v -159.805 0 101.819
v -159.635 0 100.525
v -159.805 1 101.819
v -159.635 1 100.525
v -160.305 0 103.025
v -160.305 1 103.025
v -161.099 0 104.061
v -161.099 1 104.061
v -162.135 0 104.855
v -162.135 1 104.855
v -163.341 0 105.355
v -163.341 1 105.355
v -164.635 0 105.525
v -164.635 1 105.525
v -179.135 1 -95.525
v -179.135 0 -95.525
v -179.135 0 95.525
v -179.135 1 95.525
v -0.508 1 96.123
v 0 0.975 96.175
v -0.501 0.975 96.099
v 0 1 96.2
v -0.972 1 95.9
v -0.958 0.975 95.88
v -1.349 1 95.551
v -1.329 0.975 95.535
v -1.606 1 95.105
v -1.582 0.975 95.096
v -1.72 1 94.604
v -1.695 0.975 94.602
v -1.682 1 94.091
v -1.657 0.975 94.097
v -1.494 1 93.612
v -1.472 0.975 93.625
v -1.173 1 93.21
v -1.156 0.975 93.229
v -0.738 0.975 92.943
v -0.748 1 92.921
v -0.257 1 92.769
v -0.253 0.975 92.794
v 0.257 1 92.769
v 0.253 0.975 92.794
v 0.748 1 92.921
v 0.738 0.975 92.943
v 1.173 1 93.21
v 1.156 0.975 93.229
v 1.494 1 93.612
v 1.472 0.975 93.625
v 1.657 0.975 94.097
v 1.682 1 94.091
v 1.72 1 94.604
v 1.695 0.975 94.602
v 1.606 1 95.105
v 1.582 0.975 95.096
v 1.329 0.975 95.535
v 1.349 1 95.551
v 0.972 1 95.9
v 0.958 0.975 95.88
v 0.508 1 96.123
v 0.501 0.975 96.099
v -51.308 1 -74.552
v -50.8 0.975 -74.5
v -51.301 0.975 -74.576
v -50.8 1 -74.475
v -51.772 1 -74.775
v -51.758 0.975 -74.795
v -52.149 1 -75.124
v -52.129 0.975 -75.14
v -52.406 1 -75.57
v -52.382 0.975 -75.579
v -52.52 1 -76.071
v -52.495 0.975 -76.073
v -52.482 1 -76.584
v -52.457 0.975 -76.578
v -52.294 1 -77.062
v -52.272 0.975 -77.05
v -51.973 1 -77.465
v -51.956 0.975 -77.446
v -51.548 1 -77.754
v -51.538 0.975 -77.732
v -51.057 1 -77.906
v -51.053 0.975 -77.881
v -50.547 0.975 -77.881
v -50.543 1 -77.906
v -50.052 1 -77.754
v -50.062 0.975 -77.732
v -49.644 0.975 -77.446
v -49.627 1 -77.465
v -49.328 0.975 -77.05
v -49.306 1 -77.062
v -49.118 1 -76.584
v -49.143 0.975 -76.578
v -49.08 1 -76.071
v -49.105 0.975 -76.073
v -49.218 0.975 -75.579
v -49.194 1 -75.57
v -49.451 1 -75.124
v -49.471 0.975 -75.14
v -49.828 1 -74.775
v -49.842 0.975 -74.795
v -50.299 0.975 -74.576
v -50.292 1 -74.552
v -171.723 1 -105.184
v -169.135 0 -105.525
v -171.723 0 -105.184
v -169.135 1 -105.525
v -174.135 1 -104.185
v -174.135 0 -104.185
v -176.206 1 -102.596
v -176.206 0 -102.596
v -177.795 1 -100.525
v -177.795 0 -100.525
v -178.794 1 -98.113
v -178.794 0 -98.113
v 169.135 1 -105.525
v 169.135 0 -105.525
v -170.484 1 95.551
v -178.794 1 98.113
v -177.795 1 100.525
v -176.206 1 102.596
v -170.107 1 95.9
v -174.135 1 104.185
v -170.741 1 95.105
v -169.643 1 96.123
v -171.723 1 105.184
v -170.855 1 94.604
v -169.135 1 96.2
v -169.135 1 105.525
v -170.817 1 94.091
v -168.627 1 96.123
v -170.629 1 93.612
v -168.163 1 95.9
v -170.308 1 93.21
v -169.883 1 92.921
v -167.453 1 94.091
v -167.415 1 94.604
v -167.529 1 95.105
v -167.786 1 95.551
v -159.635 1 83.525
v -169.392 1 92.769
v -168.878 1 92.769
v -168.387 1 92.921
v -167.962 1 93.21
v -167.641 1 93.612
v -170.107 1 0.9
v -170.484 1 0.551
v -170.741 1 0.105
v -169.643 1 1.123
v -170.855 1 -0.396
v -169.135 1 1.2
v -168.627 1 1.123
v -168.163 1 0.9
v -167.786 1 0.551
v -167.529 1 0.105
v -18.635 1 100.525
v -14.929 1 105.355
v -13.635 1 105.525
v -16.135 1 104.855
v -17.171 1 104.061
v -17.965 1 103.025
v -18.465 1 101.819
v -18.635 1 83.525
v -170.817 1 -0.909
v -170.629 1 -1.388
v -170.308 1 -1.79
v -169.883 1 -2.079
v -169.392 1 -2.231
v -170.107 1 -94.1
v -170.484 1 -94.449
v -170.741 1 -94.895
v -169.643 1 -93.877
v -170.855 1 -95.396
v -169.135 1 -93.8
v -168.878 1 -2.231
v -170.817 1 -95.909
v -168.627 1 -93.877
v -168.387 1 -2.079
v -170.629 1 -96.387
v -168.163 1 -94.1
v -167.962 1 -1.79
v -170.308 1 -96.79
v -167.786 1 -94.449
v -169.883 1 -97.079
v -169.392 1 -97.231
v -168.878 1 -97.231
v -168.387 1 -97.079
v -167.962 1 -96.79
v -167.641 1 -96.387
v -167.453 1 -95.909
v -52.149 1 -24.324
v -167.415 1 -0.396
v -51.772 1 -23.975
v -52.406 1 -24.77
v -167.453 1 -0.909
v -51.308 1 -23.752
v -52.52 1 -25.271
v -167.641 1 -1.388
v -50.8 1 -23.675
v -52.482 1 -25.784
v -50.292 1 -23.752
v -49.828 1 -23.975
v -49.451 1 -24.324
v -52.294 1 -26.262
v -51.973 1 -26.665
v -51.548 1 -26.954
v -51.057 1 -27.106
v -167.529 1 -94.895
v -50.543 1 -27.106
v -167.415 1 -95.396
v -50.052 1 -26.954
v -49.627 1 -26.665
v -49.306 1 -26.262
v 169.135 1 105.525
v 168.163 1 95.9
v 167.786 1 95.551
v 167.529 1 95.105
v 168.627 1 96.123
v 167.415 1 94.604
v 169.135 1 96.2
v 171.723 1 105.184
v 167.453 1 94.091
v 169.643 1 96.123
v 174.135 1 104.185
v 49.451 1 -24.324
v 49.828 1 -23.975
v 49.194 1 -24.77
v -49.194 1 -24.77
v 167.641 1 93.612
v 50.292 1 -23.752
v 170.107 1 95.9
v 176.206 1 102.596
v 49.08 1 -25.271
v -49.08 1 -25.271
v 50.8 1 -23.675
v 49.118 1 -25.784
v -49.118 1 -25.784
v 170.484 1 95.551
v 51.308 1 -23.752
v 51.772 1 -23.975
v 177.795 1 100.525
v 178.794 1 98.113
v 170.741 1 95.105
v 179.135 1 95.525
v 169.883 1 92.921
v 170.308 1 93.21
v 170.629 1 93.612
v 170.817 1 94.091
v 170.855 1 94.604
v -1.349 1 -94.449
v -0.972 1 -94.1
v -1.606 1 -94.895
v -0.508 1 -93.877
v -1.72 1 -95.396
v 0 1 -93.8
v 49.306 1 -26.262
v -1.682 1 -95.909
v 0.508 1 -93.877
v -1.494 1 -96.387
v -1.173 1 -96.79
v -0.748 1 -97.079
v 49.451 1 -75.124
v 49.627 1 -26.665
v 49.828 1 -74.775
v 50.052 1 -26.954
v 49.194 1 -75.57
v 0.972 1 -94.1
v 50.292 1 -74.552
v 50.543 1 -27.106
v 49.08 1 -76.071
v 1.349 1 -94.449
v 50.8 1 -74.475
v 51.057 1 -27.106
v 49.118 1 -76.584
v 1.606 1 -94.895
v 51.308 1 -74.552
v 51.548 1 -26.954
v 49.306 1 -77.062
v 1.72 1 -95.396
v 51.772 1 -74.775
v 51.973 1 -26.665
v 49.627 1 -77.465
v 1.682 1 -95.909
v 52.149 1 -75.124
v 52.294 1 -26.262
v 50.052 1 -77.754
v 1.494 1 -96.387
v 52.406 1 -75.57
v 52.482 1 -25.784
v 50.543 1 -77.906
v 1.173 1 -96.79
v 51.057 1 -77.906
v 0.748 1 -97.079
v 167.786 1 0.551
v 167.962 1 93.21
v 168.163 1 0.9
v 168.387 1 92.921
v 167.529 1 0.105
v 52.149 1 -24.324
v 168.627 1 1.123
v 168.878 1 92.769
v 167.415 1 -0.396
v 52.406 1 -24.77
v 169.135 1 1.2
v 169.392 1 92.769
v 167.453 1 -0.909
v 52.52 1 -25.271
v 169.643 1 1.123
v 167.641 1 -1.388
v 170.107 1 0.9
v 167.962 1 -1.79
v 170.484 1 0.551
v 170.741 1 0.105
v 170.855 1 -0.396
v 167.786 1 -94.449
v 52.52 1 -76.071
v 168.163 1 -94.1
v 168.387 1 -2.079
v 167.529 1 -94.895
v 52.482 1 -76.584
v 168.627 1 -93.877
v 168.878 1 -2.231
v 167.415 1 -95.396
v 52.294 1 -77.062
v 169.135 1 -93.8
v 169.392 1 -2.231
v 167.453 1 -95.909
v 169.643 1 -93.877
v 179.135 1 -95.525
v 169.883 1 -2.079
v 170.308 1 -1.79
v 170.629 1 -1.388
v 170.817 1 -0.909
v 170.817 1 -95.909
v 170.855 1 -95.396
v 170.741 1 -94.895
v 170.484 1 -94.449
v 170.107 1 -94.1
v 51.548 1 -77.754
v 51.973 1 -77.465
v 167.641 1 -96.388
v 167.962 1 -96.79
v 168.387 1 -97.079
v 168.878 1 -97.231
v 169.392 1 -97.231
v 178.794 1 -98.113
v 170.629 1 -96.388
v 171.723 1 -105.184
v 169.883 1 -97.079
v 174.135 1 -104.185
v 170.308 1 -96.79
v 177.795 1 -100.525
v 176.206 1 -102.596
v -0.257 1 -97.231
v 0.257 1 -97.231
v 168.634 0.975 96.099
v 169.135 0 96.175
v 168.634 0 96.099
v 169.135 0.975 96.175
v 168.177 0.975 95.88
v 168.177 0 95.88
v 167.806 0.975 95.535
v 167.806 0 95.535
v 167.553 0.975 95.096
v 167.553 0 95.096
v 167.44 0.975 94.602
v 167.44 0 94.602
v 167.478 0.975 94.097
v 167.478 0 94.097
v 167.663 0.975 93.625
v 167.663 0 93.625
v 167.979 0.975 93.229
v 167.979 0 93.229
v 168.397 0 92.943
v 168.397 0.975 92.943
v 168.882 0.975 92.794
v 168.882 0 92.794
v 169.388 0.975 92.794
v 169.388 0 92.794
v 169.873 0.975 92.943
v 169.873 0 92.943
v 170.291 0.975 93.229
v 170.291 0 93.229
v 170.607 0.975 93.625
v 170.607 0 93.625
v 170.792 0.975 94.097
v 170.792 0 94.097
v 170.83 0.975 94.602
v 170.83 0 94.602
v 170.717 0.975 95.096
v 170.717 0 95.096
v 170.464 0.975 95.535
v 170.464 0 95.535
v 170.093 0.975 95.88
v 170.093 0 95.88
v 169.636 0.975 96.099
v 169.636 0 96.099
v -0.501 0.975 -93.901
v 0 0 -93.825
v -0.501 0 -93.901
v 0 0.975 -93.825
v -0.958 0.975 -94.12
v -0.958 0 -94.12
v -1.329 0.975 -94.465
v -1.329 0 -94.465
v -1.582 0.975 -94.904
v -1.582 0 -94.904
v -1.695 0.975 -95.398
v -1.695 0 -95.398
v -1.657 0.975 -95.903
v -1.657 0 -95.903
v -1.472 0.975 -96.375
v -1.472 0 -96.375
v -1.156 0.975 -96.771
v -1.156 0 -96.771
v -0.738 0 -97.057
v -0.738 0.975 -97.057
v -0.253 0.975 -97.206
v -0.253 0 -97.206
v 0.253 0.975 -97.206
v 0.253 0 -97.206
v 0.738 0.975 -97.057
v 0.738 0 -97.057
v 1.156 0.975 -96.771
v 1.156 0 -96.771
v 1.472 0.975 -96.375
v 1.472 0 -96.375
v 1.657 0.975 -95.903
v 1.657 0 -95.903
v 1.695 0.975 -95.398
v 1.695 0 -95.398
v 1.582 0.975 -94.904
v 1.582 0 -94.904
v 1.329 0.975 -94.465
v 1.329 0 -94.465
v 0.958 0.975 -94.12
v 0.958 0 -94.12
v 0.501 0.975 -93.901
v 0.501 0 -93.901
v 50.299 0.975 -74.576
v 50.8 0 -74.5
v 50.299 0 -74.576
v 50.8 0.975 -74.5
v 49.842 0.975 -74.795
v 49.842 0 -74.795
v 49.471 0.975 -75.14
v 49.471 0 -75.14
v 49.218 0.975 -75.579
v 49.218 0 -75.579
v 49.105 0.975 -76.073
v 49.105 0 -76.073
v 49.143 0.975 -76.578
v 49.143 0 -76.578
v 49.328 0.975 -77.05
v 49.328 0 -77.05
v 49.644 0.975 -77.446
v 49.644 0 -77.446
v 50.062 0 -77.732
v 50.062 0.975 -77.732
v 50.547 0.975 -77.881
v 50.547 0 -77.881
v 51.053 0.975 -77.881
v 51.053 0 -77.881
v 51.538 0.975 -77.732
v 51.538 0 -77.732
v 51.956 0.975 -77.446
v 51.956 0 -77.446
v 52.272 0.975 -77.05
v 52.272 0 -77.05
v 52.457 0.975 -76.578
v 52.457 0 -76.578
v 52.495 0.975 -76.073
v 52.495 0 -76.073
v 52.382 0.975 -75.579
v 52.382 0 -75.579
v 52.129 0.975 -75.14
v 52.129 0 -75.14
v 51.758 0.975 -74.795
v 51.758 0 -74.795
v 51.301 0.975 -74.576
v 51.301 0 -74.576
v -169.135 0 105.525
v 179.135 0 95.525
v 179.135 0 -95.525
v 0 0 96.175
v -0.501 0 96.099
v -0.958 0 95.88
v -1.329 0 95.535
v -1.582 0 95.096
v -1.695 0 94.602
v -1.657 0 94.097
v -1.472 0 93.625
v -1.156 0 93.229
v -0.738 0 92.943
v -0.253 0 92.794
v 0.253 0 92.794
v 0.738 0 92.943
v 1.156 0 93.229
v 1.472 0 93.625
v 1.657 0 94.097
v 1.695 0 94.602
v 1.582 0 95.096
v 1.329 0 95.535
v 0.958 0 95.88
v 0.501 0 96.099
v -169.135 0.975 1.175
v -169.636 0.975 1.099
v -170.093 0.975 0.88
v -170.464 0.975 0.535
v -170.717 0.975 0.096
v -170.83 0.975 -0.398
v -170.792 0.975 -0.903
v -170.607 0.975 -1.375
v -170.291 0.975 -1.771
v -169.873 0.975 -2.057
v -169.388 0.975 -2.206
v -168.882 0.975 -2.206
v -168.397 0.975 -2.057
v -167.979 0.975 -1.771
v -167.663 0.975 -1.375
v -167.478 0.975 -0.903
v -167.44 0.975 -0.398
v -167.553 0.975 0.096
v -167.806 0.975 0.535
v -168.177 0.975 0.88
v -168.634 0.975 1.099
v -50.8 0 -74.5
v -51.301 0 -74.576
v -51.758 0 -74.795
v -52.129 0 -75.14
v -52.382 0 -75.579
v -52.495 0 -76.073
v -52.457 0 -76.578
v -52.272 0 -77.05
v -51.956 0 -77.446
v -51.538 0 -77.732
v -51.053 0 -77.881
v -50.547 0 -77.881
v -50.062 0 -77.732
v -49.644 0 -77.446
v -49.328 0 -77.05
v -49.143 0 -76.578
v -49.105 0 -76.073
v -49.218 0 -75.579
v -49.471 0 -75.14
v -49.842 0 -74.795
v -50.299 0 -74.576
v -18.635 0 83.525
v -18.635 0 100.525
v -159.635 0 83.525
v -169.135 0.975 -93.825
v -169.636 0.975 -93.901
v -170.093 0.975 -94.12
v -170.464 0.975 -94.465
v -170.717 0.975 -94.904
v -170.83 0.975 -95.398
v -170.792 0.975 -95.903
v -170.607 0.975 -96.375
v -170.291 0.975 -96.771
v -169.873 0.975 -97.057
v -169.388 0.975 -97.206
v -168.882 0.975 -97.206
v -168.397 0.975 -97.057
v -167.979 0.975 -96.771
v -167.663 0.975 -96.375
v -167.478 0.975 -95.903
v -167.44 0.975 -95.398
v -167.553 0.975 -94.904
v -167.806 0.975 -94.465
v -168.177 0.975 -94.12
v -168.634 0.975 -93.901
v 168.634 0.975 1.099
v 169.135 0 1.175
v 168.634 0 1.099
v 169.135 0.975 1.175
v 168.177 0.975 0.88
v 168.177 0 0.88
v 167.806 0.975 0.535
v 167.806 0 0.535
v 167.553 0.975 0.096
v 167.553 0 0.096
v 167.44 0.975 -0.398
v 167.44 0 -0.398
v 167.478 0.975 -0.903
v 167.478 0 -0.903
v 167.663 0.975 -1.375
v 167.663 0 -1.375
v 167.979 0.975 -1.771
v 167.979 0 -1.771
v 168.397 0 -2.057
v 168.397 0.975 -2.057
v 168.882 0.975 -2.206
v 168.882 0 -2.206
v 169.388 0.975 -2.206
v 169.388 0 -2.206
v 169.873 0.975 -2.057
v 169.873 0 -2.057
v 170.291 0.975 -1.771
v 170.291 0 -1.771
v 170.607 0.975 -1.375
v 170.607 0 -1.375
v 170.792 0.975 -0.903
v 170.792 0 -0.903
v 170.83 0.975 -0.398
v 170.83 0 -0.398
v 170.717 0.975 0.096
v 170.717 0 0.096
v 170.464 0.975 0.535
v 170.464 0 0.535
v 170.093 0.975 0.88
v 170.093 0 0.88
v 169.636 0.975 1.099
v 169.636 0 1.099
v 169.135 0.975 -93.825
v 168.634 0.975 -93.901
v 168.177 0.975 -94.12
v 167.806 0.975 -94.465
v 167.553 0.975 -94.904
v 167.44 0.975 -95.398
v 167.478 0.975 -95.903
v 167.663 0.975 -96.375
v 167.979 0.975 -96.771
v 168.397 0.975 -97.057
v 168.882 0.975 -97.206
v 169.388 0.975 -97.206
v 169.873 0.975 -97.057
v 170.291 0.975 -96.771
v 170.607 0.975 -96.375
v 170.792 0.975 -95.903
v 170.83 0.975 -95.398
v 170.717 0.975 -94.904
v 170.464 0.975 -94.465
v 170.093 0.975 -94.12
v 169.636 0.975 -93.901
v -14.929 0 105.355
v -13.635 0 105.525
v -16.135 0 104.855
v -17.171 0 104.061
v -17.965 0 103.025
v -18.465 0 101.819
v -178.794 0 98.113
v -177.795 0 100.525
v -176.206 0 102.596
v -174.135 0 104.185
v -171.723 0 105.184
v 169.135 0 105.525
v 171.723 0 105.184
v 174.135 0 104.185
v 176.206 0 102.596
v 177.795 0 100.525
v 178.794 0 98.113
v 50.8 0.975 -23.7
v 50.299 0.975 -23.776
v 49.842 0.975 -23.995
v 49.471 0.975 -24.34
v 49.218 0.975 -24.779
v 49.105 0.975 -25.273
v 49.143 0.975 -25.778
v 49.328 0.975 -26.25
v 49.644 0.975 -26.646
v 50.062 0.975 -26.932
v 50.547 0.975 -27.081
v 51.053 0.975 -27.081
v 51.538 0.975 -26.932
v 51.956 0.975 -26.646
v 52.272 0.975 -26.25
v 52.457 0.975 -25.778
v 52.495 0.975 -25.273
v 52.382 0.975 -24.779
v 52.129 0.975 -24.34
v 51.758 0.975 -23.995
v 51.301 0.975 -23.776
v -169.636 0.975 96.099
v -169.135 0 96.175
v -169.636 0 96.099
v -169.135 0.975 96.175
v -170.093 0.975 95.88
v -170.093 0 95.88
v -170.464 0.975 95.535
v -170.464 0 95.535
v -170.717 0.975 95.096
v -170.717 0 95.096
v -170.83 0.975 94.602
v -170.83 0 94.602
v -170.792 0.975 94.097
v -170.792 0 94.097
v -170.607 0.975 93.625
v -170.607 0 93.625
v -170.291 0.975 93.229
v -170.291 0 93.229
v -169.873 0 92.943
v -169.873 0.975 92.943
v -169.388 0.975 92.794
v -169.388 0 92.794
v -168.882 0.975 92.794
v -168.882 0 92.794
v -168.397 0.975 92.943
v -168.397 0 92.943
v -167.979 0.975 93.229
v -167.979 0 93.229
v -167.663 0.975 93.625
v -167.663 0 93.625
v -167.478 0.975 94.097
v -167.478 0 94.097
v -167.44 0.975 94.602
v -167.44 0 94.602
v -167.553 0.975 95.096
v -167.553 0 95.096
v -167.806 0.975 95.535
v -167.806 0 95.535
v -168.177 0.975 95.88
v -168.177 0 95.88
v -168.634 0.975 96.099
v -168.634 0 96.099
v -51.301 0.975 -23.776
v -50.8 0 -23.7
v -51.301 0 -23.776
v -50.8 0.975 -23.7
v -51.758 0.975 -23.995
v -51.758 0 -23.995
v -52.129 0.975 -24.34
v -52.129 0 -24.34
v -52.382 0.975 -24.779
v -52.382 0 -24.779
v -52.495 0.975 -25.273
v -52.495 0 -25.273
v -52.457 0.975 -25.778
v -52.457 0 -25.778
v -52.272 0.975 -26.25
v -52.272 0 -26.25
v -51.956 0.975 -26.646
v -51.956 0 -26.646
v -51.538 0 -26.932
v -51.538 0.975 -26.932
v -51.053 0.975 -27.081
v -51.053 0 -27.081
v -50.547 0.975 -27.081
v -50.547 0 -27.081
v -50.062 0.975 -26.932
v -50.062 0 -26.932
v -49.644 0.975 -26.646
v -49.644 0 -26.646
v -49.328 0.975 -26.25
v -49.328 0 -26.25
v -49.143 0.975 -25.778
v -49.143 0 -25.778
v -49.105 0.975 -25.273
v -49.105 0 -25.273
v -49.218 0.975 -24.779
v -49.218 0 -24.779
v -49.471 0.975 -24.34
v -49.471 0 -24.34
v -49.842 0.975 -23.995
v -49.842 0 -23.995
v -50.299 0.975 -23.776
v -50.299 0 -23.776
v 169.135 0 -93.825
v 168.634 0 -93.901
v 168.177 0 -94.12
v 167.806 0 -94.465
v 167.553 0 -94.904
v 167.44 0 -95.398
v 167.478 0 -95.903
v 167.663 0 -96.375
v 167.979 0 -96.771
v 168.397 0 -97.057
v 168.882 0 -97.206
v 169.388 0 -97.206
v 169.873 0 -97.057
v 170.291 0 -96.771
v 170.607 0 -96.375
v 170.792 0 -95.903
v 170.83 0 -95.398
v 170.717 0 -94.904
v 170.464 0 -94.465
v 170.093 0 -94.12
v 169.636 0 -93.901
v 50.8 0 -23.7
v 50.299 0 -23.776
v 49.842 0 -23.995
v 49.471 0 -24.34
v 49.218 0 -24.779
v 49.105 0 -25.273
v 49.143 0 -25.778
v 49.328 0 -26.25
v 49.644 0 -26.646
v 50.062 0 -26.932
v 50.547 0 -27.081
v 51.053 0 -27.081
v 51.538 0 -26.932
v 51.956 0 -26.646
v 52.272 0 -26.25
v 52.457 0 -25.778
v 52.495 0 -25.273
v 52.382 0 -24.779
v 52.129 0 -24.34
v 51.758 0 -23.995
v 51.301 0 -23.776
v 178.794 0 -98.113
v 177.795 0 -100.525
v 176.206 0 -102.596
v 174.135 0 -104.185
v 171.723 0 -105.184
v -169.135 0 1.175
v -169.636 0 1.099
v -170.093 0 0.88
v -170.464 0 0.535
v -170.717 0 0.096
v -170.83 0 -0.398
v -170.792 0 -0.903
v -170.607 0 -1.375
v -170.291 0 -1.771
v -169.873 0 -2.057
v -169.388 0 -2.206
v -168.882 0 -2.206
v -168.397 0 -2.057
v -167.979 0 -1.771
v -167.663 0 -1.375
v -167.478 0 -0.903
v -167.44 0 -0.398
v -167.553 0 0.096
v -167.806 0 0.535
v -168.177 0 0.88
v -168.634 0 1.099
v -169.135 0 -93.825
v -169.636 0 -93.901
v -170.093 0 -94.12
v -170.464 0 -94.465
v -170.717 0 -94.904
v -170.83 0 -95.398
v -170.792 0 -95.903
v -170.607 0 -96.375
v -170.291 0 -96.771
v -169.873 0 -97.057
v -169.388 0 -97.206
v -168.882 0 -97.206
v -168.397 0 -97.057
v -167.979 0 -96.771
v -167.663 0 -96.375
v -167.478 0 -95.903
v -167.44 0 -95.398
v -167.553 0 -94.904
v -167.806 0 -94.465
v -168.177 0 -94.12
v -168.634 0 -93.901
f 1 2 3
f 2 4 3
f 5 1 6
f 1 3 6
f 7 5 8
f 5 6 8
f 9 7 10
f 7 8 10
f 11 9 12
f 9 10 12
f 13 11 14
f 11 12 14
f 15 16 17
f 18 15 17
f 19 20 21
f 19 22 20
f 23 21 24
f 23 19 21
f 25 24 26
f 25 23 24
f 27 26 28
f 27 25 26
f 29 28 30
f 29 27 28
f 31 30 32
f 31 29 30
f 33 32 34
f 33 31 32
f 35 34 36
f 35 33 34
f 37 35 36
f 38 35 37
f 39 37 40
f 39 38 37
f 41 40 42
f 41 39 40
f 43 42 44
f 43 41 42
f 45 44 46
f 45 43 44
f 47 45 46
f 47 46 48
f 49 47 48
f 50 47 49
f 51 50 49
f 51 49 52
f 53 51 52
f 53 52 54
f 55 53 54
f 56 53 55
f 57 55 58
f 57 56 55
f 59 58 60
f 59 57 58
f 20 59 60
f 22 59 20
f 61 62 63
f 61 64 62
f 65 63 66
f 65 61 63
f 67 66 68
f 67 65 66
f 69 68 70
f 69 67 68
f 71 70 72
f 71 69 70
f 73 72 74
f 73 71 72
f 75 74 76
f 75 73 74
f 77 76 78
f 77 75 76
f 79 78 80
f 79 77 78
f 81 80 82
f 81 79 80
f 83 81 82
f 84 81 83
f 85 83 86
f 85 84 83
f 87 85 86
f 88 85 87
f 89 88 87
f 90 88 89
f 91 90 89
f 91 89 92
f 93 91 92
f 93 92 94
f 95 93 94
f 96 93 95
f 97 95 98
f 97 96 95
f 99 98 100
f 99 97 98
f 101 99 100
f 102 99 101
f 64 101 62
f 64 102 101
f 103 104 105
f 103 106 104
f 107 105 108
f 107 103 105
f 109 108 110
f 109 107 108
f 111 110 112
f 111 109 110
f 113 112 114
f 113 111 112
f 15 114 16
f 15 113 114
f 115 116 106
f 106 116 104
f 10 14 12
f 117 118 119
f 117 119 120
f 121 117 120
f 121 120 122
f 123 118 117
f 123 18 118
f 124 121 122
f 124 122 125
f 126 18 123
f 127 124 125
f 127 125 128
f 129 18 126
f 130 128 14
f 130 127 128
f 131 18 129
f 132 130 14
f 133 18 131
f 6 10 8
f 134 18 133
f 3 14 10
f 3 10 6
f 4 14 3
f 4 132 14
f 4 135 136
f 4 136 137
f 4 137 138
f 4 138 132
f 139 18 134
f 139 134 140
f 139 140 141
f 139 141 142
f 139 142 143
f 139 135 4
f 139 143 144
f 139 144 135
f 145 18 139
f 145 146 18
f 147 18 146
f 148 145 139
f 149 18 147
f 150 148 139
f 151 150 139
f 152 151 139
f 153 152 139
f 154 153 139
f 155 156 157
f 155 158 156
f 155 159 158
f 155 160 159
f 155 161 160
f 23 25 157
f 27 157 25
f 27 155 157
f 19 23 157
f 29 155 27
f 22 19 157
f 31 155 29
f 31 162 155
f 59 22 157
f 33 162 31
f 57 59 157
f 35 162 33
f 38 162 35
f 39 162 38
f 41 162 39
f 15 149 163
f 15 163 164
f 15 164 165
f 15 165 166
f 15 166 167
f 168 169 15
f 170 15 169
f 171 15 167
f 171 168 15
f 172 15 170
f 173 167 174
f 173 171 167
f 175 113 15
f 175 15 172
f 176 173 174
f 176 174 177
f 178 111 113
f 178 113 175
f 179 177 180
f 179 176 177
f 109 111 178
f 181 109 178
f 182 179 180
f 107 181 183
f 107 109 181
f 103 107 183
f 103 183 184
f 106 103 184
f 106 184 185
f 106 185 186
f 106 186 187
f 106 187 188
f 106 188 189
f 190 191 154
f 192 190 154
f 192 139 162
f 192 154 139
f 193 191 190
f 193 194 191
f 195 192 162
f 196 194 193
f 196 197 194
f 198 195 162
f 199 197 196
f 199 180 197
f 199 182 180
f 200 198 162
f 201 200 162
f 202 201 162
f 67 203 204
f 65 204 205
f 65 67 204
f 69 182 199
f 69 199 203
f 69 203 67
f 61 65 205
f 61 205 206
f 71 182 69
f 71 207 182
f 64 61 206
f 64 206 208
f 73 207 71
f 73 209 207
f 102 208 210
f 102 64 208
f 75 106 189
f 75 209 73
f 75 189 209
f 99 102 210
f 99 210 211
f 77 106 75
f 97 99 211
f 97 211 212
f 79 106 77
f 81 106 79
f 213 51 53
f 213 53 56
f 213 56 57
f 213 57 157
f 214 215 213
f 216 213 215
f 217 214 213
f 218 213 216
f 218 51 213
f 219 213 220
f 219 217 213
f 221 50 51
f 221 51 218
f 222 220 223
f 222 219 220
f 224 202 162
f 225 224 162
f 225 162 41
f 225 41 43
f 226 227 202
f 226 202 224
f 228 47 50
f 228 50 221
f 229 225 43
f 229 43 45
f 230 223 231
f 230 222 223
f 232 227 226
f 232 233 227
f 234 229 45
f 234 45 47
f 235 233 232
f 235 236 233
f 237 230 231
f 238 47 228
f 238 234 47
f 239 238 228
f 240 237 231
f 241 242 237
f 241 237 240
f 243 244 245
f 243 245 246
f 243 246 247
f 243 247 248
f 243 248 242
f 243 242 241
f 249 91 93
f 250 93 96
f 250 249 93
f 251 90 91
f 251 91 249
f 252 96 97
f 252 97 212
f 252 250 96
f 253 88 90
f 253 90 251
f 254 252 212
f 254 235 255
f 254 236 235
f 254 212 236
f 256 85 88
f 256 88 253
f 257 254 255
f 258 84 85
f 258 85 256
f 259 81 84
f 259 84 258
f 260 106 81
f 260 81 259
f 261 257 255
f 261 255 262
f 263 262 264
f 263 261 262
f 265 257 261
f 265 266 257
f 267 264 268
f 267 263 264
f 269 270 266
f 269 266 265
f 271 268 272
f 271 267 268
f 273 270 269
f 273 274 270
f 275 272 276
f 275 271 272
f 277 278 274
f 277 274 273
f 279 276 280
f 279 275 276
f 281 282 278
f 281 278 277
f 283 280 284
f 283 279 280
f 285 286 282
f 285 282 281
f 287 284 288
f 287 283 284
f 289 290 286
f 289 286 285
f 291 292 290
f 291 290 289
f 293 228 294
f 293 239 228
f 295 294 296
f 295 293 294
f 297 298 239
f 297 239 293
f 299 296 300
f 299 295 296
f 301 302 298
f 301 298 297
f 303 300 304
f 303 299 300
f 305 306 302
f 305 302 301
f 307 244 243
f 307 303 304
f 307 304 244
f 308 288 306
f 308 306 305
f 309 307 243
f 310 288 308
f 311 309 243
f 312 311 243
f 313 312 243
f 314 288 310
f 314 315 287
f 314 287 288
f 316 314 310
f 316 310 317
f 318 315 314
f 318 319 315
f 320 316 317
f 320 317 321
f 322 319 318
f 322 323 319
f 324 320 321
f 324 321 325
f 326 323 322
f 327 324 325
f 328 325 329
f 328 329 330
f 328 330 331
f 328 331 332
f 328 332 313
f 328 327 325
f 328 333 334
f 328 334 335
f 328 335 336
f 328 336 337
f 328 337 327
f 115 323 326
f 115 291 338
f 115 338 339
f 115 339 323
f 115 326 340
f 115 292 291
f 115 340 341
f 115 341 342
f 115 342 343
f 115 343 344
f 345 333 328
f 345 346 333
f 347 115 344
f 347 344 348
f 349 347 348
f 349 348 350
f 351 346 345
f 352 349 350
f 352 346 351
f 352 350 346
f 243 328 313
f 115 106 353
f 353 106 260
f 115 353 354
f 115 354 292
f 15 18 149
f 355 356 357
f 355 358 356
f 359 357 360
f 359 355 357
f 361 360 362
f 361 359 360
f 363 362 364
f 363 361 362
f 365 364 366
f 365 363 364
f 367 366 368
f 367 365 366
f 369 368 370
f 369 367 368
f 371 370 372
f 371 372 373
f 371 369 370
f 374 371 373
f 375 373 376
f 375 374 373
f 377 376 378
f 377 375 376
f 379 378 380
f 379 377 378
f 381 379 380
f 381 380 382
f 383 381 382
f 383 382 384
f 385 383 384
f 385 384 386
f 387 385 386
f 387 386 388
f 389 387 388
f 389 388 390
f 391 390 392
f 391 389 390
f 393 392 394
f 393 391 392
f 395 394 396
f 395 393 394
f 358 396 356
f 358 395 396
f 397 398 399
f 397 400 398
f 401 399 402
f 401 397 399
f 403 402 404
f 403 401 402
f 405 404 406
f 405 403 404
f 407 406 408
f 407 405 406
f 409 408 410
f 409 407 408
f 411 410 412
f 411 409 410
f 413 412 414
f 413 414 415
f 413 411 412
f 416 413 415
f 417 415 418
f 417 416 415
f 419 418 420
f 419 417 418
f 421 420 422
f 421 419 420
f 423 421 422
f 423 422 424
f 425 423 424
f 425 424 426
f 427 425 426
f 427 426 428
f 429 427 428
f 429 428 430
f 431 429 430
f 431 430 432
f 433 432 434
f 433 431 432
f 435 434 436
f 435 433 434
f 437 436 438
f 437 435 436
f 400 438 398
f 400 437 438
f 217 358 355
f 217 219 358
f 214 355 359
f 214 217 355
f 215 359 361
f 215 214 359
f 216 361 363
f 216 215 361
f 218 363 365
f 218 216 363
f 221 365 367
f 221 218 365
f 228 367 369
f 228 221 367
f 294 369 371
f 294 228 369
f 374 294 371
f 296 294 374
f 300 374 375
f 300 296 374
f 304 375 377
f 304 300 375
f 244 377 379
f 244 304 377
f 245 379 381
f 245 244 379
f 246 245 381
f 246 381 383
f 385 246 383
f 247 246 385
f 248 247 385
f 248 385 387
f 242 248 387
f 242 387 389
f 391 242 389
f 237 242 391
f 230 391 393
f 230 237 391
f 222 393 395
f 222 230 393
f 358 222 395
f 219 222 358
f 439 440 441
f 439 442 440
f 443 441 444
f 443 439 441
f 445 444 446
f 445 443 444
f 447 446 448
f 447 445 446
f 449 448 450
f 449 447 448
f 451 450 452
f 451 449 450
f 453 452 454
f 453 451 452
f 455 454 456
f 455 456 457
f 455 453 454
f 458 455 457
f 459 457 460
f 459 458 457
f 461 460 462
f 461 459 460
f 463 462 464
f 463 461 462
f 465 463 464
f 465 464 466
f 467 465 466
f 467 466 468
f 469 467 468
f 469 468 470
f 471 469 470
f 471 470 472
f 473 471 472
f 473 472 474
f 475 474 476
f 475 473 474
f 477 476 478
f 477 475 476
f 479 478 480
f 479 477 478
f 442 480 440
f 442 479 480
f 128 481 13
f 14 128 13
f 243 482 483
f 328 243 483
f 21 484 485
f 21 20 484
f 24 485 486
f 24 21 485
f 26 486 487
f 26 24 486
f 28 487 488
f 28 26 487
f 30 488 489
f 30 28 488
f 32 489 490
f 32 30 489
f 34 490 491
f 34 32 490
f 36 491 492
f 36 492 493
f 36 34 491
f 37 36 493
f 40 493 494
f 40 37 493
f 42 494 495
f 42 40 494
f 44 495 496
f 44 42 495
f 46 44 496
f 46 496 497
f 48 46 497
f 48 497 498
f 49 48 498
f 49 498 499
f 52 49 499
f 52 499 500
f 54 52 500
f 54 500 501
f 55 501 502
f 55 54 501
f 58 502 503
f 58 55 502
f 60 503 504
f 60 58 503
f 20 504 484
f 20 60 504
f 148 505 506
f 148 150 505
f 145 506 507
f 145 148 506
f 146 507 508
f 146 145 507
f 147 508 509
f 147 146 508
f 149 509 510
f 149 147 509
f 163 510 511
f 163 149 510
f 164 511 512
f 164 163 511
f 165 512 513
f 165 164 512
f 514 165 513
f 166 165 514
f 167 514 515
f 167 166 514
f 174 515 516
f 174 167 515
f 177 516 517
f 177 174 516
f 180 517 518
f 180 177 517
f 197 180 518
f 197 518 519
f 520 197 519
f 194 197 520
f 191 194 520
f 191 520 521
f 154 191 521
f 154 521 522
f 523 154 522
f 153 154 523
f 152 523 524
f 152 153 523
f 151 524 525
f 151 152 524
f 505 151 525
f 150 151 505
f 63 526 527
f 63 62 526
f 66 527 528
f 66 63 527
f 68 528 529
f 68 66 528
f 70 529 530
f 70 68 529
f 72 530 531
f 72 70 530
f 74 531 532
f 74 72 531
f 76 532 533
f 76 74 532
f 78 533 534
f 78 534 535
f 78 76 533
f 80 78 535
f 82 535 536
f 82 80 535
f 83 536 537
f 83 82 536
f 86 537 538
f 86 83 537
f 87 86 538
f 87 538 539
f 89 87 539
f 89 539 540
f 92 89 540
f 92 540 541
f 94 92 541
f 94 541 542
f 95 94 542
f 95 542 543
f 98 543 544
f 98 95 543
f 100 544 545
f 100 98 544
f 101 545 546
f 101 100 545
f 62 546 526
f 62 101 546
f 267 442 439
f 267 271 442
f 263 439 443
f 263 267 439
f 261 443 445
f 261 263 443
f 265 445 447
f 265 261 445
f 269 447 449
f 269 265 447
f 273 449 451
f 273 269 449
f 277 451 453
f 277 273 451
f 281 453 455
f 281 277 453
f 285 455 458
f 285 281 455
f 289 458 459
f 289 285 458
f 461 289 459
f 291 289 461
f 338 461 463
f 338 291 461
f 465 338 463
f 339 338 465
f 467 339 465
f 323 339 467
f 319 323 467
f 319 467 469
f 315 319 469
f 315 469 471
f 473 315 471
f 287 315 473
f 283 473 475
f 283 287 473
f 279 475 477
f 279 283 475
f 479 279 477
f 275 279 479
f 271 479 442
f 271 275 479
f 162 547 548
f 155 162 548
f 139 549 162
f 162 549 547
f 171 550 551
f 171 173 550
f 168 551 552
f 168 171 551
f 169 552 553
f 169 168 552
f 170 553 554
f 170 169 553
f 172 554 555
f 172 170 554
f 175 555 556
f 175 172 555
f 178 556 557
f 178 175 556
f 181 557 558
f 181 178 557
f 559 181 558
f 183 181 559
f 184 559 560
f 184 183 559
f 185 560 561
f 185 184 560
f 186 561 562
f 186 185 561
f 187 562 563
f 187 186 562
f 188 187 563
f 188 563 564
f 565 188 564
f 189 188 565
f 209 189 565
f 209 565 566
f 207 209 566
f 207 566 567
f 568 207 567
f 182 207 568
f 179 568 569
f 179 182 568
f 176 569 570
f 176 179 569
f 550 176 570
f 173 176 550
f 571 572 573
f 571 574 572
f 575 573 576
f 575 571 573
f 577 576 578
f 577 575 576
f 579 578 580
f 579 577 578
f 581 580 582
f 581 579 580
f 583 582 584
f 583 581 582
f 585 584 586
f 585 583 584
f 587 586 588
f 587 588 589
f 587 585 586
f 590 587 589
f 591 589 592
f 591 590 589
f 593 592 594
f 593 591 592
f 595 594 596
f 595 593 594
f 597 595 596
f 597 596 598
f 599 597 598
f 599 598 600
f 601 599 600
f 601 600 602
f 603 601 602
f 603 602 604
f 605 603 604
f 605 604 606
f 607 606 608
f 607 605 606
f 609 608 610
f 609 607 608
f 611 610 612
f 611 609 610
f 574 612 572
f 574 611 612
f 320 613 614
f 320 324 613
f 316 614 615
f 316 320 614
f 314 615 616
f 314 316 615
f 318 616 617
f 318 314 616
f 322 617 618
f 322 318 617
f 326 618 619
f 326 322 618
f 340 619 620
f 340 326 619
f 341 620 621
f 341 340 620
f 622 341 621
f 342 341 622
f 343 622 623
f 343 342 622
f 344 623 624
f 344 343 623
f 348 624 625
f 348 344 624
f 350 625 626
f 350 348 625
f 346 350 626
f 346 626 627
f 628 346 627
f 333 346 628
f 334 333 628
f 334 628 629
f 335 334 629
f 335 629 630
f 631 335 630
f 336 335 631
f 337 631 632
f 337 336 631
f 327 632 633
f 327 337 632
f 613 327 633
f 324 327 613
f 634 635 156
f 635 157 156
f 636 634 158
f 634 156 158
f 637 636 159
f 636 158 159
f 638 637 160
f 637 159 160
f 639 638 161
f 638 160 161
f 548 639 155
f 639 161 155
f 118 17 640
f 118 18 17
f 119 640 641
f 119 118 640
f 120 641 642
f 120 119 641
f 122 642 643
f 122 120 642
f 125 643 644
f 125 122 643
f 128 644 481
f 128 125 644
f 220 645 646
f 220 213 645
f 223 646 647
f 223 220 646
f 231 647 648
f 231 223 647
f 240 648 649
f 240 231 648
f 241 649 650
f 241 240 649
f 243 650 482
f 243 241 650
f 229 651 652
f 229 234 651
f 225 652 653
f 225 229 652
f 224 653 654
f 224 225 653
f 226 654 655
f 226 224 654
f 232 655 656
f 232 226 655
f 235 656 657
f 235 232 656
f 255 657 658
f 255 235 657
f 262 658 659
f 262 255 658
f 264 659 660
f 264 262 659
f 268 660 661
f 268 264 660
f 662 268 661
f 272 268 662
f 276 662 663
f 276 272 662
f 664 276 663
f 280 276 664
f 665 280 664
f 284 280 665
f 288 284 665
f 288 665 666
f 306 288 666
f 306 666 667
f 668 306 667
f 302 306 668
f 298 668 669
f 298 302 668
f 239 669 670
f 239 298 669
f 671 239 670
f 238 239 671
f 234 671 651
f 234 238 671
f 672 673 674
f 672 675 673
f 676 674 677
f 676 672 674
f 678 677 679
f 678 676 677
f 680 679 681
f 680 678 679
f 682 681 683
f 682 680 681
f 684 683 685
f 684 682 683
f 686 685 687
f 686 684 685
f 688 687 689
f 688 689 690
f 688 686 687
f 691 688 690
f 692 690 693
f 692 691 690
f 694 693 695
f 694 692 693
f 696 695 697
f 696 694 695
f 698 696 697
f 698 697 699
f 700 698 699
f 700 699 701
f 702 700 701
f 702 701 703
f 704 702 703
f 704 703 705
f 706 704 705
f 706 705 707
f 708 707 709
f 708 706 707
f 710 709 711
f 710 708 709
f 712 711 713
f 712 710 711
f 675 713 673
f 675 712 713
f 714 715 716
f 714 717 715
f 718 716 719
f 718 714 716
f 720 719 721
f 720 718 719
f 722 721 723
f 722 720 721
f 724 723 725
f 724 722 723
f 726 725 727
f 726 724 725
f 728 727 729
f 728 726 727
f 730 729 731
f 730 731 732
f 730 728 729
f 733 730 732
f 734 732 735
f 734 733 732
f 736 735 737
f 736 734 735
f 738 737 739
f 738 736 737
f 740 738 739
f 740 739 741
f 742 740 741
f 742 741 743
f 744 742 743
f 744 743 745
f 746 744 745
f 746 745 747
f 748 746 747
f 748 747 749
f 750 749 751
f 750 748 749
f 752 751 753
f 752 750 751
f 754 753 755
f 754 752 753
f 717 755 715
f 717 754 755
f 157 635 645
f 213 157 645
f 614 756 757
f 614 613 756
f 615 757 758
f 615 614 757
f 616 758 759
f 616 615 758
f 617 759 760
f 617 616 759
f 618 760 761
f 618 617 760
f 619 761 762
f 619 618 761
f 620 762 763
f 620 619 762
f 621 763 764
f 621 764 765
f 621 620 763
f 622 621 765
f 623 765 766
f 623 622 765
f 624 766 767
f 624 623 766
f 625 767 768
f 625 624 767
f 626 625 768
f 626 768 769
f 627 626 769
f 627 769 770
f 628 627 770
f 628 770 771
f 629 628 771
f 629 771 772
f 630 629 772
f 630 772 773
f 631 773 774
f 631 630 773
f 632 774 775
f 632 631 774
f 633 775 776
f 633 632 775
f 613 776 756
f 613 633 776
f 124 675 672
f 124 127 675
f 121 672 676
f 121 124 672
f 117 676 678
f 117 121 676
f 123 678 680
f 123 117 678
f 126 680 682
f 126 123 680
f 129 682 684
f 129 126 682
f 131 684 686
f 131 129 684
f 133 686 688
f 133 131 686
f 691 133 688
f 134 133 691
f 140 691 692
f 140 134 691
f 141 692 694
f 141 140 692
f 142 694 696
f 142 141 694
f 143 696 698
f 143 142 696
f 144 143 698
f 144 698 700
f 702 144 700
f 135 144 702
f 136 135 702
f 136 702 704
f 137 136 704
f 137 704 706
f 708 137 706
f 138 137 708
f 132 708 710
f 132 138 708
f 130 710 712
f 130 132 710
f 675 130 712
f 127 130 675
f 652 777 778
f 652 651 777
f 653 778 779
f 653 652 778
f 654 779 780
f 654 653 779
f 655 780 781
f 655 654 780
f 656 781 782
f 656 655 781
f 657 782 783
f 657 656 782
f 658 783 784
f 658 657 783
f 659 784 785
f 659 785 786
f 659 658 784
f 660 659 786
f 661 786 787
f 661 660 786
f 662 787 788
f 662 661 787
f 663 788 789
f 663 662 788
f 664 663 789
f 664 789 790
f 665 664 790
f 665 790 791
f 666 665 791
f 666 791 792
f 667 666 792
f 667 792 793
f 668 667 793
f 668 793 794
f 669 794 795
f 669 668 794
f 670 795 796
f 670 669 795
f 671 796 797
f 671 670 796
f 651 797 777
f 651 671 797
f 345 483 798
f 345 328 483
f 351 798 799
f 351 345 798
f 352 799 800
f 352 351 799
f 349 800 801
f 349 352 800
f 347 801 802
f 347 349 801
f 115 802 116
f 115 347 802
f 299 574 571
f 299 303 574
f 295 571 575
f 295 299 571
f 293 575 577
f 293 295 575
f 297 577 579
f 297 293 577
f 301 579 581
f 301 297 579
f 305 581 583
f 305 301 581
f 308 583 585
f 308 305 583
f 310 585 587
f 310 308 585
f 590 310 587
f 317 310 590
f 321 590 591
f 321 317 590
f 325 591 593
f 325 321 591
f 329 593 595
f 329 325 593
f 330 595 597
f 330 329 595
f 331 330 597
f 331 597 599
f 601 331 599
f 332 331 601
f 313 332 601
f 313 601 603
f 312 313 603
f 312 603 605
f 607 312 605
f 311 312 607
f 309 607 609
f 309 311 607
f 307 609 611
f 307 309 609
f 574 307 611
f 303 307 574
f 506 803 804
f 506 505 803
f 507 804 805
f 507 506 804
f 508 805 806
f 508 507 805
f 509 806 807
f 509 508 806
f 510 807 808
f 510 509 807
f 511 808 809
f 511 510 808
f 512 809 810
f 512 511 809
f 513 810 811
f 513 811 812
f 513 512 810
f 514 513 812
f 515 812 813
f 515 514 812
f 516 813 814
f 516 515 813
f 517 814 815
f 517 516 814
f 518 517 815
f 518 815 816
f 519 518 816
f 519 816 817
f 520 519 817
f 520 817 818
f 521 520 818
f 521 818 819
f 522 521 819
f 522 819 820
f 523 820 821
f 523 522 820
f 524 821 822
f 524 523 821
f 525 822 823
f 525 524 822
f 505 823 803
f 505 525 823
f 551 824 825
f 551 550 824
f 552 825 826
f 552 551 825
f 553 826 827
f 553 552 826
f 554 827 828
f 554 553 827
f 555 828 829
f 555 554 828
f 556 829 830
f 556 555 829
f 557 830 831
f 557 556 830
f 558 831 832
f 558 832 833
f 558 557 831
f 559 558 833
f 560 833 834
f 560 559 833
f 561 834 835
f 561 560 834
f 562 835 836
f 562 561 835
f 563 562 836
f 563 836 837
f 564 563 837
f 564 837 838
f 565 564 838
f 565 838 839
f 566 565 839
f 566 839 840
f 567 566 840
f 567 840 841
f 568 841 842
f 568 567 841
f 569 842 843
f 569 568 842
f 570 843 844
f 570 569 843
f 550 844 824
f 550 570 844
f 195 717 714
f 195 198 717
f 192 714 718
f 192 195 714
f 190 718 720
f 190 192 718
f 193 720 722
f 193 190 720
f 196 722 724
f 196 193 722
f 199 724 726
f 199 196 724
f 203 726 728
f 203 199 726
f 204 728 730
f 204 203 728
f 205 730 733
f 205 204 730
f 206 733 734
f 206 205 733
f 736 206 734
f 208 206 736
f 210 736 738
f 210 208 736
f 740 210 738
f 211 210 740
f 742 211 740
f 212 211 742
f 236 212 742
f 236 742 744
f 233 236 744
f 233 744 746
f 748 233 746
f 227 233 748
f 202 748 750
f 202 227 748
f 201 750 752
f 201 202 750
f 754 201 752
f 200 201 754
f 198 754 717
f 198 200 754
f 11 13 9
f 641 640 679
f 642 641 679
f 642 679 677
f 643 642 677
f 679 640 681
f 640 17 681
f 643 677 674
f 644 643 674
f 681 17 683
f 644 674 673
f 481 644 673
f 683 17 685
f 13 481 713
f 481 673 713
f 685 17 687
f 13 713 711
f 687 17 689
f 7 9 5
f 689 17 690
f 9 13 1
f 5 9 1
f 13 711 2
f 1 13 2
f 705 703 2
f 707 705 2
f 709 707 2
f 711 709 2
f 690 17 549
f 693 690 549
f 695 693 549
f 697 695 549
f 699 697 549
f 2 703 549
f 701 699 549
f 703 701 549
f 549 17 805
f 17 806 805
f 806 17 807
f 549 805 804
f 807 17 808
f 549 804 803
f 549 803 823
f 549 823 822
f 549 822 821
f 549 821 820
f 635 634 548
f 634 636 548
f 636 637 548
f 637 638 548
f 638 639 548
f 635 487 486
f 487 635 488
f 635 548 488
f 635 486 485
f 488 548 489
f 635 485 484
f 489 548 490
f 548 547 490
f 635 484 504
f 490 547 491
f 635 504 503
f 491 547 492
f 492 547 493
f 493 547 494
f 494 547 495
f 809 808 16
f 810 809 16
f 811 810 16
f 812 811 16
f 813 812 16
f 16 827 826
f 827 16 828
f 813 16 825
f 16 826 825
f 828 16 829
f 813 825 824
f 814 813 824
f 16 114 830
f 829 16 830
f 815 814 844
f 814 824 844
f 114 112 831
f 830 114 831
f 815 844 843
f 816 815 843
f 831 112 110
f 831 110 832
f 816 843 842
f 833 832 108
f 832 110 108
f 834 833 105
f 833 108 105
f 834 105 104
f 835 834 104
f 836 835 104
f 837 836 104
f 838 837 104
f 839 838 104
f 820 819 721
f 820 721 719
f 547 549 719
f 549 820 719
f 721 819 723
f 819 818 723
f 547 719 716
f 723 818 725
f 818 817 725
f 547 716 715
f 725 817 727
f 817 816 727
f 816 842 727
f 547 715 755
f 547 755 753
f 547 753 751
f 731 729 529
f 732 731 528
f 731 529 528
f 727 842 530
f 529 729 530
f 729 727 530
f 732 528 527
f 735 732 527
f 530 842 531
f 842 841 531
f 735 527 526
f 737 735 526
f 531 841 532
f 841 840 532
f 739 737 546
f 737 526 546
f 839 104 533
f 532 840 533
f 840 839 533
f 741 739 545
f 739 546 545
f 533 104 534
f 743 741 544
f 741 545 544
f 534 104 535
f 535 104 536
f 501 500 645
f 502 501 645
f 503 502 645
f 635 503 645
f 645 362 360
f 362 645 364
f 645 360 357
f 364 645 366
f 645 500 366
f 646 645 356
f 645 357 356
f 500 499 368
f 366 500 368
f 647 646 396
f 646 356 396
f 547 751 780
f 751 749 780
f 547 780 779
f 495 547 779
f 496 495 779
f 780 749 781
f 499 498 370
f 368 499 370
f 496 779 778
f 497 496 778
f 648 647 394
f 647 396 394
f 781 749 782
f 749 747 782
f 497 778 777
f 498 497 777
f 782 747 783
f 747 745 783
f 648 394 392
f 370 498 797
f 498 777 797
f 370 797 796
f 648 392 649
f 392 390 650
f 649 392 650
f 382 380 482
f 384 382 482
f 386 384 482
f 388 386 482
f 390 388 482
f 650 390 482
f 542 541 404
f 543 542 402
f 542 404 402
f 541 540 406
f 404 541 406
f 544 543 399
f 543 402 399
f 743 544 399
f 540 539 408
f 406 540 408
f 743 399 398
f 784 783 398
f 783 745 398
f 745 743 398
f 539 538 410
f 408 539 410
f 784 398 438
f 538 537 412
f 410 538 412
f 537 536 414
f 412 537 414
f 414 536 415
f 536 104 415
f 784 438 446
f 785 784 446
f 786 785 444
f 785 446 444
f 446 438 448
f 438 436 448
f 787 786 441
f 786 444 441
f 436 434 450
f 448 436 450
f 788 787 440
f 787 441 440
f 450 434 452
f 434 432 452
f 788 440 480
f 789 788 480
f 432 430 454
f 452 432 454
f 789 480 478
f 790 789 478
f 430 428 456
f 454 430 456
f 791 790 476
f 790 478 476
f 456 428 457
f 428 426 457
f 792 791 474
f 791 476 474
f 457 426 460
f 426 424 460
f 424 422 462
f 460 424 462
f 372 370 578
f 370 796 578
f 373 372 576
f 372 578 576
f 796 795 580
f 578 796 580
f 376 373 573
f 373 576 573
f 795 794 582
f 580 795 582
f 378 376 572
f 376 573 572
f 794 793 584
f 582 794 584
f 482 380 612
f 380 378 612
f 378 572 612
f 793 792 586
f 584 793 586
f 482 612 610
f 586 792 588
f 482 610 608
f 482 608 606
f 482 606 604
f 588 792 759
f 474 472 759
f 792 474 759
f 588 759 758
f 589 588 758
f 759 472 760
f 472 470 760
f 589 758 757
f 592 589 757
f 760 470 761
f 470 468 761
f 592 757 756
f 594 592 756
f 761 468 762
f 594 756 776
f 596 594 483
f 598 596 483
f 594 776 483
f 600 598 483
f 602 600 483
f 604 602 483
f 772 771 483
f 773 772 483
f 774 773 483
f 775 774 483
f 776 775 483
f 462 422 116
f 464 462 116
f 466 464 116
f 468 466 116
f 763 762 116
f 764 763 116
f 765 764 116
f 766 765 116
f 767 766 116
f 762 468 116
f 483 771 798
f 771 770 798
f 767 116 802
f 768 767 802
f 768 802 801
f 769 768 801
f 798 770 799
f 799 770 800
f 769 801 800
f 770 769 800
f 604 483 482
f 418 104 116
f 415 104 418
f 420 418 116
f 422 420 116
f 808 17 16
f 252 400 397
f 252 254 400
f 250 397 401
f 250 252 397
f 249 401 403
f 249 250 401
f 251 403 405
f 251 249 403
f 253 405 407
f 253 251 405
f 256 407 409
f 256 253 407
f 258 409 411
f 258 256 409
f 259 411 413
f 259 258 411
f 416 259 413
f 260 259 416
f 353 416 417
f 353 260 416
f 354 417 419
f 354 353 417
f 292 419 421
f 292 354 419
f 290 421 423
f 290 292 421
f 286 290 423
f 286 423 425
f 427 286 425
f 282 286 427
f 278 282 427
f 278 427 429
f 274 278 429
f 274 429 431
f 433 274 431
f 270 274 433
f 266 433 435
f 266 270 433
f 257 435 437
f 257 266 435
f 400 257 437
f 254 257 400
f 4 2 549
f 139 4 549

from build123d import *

# Parameters (mm, degrees)
BOSS_EXTRUDE1_DEPTH           = 1
FILLET1_R                     = 10
M3_CLEARANCE_HOLE1_AT_2_COUNT = 2
M3_CLEARANCE_HOLE1_AT_2_PITCH = 95
M3_CLEARANCE_HOLE1_AT_3_COUNT = 2
M3_CLEARANCE_HOLE1_AT_3_PITCH = 95
M3_CLEARANCE_HOLE1_AT_4_COUNT = 2
M3_CLEARANCE_HOLE1_AT_4_PITCH = 193.988783761
M3_CLEARANCE_HOLE1_AT_5_COUNT = 2
M3_CLEARANCE_HOLE1_AT_5_PITCH = 351.356788607
M3_CLEARANCE_HOLE1_AT_6_COUNT = 2
M3_CLEARANCE_HOLE1_AT_6_PITCH = 338.27
M3_CLEARANCE_HOLE1_AT_7_COUNT = 2
M3_CLEARANCE_HOLE1_AT_7_PITCH = 351.356788607
M3_CLEARANCE_HOLE1_AT_8_COUNT = 2
M3_CLEARANCE_HOLE1_AT_8_PITCH = 193.988783761
M3_CLEARANCE_HOLE3_AT_2_COUNT = 2
M3_CLEARANCE_HOLE3_AT_2_PITCH = 50.8
M3_CLEARANCE_HOLE3_AT_3_COUNT = 2
M3_CLEARANCE_HOLE3_AT_3_PITCH = 101.6
M3_CLEARANCE_HOLE3_AT_4_COUNT = 2
M3_CLEARANCE_HOLE3_AT_4_PITCH = 113.592253257
FILLET2_R                     = 5


with BuildPart() as part:
    # Sketch1 → Boss-Extrude1 (new body)
    with BuildSketch(Plane(origin=(0, 0, 0), x_dir=(1, 0, 0), z_dir=(0, 1, 0))):
        Polygon((-159.635, -105.525), (-159.635, -83.525), (-18.635, -83.525), (-18.635, -105.525), (179.135, -105.525), (179.135, 105.525), (-179.135, 105.525), (-179.135, -105.525), align=None)
    extrude(amount=BOSS_EXTRUDE1_DEPTH)

    # Fillet1
    fillet1_edges = [part.edges().sort_by_distance(p)[0] for p in [
        (-179.135, 0.5, 105.525),
        (-179.135, 0.5, -105.525),
        (179.135, 0.5, -105.525),
        (179.135, 0.5, 105.525),
    ]]
    fillet(fillet1_edges, radius=FILLET1_R)

    # Sketch3 → M3 Clearance Hole1 (revolve, cut)
    with BuildSketch(Plane(origin=(169.135, 1, -0.525), x_dir=(0, 0, 1), z_dir=(1, 0, 0))):
        Polygon((0, 0), (0, 1), (1.7, 1), (1.7, 0.025), (1.725, 0), align=None)
    m3_clearance_hole1 = revolve(axis=Axis((169.135, 7.35, -0.525), (0, -1, 0)), mode=Mode.SUBTRACT)

    # M3 Clearance Hole1 at 2: M3 Clearance Hole1 ×2
    with Locations(*[(0, 0, i * M3_CLEARANCE_HOLE1_AT_2_PITCH) for i in range(1, M3_CLEARANCE_HOLE1_AT_2_COUNT)]):
        add(m3_clearance_hole1, mode=Mode.SUBTRACT)

    # M3 Clearance Hole1 at 3: M3 Clearance Hole1 ×2
    with Locations(*[(0, 0, -i * M3_CLEARANCE_HOLE1_AT_3_PITCH) for i in range(1, M3_CLEARANCE_HOLE1_AT_3_COUNT)]):
        add(m3_clearance_hole1, mode=Mode.SUBTRACT)

    # M3 Clearance Hole1 at 4: M3 Clearance Hole1 ×2
    with Locations(*[Vector(-0.871880305, 0, -0.489719035) * (i * M3_CLEARANCE_HOLE1_AT_4_PITCH) for i in range(1, M3_CLEARANCE_HOLE1_AT_4_COUNT)]):
        add(m3_clearance_hole1, mode=Mode.SUBTRACT)

    # M3 Clearance Hole1 at 5: M3 Clearance Hole1 ×2
    with Locations(*[Vector(-0.962753563, 0, -0.270380431) * (i * M3_CLEARANCE_HOLE1_AT_5_PITCH) for i in range(1, M3_CLEARANCE_HOLE1_AT_5_COUNT)]):
        add(m3_clearance_hole1, mode=Mode.SUBTRACT)

    # M3 Clearance Hole1 at 6: M3 Clearance Hole1 ×2
    with Locations(*[(-i * M3_CLEARANCE_HOLE1_AT_6_PITCH, 0, 0) for i in range(1, M3_CLEARANCE_HOLE1_AT_6_COUNT)]):
        add(m3_clearance_hole1, mode=Mode.SUBTRACT)

    # M3 Clearance Hole1 at 7: M3 Clearance Hole1 ×2
    with Locations(*[Vector(-0.962753563, 0, 0.270380431) * (i * M3_CLEARANCE_HOLE1_AT_7_PITCH) for i in range(1, M3_CLEARANCE_HOLE1_AT_7_COUNT)]):
        add(m3_clearance_hole1, mode=Mode.SUBTRACT)

    # M3 Clearance Hole1 at 8: M3 Clearance Hole1 ×2
    with Locations(*[Vector(-0.871880305, 0, 0.489719035) * (i * M3_CLEARANCE_HOLE1_AT_8_PITCH) for i in range(1, M3_CLEARANCE_HOLE1_AT_8_COUNT)]):
        add(m3_clearance_hole1, mode=Mode.SUBTRACT)

    # Sketch5 → M3 Clearance Hole3 (revolve, cut)
    with BuildSketch(Plane(origin=(50.8, 1, -25.4), x_dir=(0, 0, 1), z_dir=(1, 0, 0))):
        Polygon((0, 0), (0, 1), (1.7, 1), (1.7, 0.025), (1.725, 0), align=None)
    m3_clearance_hole3 = revolve(axis=Axis((50.8, 7.35, -25.4), (0, -1, 0)), mode=Mode.SUBTRACT)

    # M3 Clearance Hole3 at 2: M3 Clearance Hole3 ×2
    with Locations(*[(0, 0, -i * M3_CLEARANCE_HOLE3_AT_2_PITCH) for i in range(1, M3_CLEARANCE_HOLE3_AT_2_COUNT)]):
        add(m3_clearance_hole3, mode=Mode.SUBTRACT)

    # M3 Clearance Hole3 at 3: M3 Clearance Hole3 ×2
    with Locations(*[(-i * M3_CLEARANCE_HOLE3_AT_3_PITCH, 0, 0) for i in range(1, M3_CLEARANCE_HOLE3_AT_3_COUNT)]):
        add(m3_clearance_hole3, mode=Mode.SUBTRACT)

    # M3 Clearance Hole3 at 4: M3 Clearance Hole3 ×2
    with Locations(*[Vector(-0.894427191, 0, -0.447213595) * (i * M3_CLEARANCE_HOLE3_AT_4_PITCH) for i in range(1, M3_CLEARANCE_HOLE3_AT_4_COUNT)]):
        add(m3_clearance_hole3, mode=Mode.SUBTRACT)

    # Fillet2
    fillet2_edges = [part.edges().sort_by_distance(p)[0] for p in [
        (-18.635, 0.5, 105.525),
        (-159.635, 0.5, 105.525),
    ]]
    fillet(fillet2_edges, radius=FILLET2_R)


solid = part.part
